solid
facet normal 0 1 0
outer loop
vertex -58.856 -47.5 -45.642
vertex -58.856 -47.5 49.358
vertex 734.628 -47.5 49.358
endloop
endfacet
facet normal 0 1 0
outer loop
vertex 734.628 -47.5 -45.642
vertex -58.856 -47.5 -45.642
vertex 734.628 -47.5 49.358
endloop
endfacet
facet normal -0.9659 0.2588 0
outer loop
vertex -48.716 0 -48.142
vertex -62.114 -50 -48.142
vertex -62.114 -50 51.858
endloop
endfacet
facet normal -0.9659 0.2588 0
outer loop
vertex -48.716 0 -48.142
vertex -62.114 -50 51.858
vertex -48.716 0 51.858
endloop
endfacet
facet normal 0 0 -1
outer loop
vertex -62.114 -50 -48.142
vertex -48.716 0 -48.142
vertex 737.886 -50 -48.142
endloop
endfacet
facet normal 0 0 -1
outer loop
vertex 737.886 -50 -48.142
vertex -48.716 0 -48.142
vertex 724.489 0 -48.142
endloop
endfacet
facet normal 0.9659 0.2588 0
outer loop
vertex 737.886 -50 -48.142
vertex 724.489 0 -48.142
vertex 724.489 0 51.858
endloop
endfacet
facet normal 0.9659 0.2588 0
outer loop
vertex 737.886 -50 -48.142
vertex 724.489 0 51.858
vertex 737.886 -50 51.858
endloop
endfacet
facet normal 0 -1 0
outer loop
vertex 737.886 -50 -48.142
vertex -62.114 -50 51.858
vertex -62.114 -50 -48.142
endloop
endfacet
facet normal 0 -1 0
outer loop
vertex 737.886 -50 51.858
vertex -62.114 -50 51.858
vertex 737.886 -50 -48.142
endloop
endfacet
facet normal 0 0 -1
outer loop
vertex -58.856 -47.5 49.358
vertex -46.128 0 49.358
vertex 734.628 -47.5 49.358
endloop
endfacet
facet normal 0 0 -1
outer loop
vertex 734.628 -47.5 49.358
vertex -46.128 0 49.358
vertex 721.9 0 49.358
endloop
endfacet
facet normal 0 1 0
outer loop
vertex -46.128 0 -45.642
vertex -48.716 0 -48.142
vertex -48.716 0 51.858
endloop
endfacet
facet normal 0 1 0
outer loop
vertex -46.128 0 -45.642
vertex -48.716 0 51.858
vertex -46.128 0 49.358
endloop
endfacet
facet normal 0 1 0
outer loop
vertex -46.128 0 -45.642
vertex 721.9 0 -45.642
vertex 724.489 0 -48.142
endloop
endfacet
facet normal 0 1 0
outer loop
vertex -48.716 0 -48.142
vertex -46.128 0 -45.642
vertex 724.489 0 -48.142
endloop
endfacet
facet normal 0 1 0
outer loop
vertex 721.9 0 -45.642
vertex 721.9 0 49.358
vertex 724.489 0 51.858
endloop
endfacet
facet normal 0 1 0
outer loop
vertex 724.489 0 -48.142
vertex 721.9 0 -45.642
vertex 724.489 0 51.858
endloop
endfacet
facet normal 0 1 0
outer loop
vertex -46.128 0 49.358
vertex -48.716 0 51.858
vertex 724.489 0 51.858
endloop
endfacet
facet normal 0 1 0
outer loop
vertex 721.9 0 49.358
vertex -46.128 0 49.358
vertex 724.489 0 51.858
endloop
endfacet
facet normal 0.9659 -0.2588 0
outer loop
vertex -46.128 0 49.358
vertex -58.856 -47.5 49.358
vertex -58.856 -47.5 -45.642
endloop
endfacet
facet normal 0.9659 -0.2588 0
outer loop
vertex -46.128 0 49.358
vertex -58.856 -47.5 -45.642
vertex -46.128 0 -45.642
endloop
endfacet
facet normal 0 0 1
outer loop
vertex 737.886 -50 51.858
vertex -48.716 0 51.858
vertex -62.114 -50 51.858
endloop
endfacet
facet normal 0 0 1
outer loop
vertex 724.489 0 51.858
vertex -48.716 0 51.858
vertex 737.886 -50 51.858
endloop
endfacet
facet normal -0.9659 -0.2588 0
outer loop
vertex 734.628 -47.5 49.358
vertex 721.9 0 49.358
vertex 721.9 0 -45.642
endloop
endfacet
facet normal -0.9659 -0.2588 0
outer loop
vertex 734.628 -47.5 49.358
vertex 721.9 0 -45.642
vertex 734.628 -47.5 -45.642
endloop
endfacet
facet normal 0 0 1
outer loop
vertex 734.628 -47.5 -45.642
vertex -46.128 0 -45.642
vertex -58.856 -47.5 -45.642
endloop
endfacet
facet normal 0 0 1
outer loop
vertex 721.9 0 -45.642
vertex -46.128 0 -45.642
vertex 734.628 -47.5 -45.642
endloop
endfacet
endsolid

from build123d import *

# Parameters (mm, degrees)
F0_W     = 800
F0_H     = 100
F1_DEPTH = 50
F3_DEPTH = 100.001
F4_T     = -2.5


with BuildPart() as f1:
    # F0 (on Front) → F1 (new body)
    with BuildSketch(Plane.XZ):
        with Locations((337.88613, 1.85813)):
            Rectangle(F0_W, F0_H)
    extrude(amount=F1_DEPTH)

    # F2 (on face) → F3 (cut, through all)
    with BuildSketch(Plane.XY.offset(51.85813)):
        Polygon((-61.941713, -51.992044), (-62.11387, -50), (-36.069817, 47.197729), (-99.164672, 0), (-90.427369, -71.46059), align=None)
        Polygon((713.151226, 42.311921), (737.88613, -50), (805.342257, -50.860211), (814.011762, 33.620565), align=None)
    extrude(amount=-F3_DEPTH, mode=Mode.SUBTRACT)

    # F4
    f4_openings = [f1.faces().sort_by_distance(p)[0] for p in [
        (337.88613, 0, 1.85813),
    ]]
    offset(amount=F4_T, openings=f4_openings)


solid = f1.part
